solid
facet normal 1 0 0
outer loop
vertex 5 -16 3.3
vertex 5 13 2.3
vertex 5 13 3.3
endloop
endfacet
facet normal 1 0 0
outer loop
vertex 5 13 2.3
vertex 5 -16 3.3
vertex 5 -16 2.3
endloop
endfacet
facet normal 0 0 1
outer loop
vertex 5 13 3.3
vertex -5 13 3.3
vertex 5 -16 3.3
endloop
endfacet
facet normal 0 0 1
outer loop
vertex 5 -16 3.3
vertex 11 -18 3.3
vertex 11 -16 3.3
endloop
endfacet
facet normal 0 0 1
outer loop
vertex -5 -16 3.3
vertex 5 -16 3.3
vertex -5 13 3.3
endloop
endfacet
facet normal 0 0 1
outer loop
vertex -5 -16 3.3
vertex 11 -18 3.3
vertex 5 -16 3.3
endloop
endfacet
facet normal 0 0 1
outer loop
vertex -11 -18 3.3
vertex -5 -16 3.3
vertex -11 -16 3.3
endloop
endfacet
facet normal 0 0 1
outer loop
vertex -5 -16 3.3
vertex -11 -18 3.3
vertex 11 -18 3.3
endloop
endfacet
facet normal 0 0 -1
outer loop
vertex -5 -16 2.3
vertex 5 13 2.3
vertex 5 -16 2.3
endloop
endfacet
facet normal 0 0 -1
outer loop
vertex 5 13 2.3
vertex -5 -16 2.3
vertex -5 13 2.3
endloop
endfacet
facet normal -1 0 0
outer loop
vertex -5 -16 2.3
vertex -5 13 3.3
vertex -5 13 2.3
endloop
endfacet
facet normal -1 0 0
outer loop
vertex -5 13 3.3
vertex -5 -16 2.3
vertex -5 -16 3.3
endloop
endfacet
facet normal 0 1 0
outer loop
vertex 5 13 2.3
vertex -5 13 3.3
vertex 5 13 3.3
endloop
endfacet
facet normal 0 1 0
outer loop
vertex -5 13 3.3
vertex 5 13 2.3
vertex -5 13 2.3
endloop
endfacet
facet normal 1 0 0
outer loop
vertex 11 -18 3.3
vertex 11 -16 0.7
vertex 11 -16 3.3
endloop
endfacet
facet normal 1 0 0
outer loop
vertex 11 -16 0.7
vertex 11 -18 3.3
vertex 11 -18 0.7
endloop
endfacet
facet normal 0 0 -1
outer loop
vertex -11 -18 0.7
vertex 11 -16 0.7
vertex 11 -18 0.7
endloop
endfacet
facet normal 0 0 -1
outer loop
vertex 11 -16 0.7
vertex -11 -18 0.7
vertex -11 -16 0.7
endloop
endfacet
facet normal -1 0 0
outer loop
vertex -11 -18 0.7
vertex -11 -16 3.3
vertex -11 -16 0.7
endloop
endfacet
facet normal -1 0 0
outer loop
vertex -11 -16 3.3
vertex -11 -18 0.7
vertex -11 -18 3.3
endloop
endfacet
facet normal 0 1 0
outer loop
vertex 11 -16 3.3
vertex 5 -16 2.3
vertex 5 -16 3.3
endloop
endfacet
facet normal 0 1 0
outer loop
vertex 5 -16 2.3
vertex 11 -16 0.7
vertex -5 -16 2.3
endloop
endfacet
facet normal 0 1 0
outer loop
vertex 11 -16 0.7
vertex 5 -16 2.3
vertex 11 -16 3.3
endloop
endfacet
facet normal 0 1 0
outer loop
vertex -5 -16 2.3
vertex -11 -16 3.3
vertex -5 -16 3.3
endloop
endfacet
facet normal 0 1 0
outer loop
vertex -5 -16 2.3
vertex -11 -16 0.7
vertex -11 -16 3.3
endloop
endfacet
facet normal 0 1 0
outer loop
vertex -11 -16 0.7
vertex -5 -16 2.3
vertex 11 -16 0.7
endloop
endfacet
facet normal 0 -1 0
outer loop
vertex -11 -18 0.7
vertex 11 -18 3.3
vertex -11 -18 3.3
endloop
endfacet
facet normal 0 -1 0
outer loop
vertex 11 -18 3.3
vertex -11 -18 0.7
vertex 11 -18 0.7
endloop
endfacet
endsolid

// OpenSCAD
module pins(numPins){
  space=2.6;
  translate([0,-(space*numPins)/2])
  union(){
    for (i=[0:numPins-1]) {
      translate([0,i*space,0]){
        translate([0,0,2])cube([0.5,0.5,11],center=true);
        minkowski(){
          cube(1.5,center=true);
          sphere(0.25);
        }
        if(i < numPins-1){
          translate([0,1,0])cube(1.3,center=true);
        }
      } 
    }
  }
}

module proMicro(pins=true){
  translate([0,0,-0])import("pro-micro.stl");
  if(pins){
    translate([7.5,0.5,1.75])pins(12);
    translate([-7.5,0.5,1.75])pins(12);
  }
}
module holder_base(){
  difference(){
    cube([22,37,4.5], center=true);
    cube([18.2,33.2,6], center=true);
    translate([0,17,1.7])cube([8,4,3], center=true);
    translate([0,-17,2])cube([23,2,2.6],center=true);
  }
  translate([0,0,-1.6])cube([10,37,1.3],center=true);
}

module holder_lid(){
  union(){
    translate([0,-2,2.8])cube([10,30,1],center=true);
    translate([0,-17,2])cube([22,2,2.6],center=true);
  }
}

// proMicro();
// holder_base();
holder_lid();
